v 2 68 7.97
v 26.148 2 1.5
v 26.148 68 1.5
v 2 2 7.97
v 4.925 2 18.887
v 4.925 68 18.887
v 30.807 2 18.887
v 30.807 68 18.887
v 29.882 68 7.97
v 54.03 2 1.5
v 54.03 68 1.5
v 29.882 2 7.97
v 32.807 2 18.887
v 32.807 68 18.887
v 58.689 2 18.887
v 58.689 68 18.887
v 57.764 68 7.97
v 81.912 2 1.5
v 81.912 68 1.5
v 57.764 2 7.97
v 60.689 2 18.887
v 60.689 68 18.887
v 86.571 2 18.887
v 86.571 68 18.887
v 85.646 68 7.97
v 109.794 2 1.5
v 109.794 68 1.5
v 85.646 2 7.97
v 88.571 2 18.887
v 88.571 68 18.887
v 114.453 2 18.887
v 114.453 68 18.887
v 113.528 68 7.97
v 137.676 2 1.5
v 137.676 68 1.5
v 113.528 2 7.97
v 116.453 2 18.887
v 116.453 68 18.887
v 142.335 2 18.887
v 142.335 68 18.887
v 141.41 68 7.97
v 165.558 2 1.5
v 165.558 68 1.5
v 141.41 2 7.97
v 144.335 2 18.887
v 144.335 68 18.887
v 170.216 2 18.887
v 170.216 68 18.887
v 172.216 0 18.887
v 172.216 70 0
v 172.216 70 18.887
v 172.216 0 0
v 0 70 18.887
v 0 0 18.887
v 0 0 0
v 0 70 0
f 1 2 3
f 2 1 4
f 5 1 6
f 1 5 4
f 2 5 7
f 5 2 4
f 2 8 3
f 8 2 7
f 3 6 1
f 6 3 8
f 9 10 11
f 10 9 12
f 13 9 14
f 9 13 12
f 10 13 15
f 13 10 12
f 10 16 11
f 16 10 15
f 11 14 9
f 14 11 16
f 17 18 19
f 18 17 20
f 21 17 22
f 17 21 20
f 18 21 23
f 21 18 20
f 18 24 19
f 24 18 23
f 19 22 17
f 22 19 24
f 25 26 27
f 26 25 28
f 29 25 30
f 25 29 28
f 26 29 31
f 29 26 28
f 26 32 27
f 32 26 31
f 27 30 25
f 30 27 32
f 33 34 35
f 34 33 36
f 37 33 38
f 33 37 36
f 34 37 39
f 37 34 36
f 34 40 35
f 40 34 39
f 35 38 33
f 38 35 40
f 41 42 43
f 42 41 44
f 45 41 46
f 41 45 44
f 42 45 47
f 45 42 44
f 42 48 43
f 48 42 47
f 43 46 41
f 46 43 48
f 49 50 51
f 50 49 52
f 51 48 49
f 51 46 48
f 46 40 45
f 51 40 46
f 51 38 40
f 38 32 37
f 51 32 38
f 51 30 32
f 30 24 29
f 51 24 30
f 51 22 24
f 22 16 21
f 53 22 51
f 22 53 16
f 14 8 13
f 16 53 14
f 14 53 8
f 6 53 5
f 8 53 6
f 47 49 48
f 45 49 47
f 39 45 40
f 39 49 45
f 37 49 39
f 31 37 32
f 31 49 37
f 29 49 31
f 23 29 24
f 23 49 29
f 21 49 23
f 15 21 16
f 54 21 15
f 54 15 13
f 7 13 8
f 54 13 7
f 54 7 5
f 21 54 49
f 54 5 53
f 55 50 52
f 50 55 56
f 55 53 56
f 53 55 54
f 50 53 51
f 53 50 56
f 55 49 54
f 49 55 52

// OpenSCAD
/* [Magstand] */

mags = 6; // [1:100]
magsize_length = 66; // [1:200]
magsize_width = 25; // [1:200]
magsize_height = 18; // [1:200]
mag_gap = 2;

mag_inclination_deg = 15;  // [0:45]
// text_inclination_deg = 11;

holder_base_height = 1.5; // [0.5:10]

// text_side = "none";
// text_offset = 1.5;
// text_size = 10;
// text = "AR-15 5.56";

/* [Hidden] */

// Vars
complete_height = holder_base_height + magsize_height;
hole_maker = 0.01;

// Magazine slots    
maghole_points = [[0,0],[magsize_width,0],[magsize_width,magsize_length],[0,magsize_length]];

// Rotated point
maghole_point = [magsize_width,0];
maghole_point_rotated = rotate_point(maghole_point[0],maghole_point[1], -mag_inclination_deg);

// Normal inclination (-1/incl)
maghole_norm_incl = -1 / ((maghole_point_rotated[1] / maghole_point_rotated[0]));    
maghole_norm_ground_ix = -1 * (maghole_point_rotated[1] / maghole_norm_incl);

// Offset that is needed to satisfy a gap of 0
maghole_offset = maghole_norm_ground_ix + maghole_point_rotated[0];

// The y translation that is needed to satisfy the base height
move_holes_up = -1 * maghole_point_rotated[1] + holder_base_height;

// Calculate hole depth needed to have back edge completely sunken
maghole_point_upper = [magsize_width, magsize_height];
maghole_point_upper_rotated = rotate_point(magsize_width, magsize_height, - mag_inclination_deg);    
holder_height = holder_base_height + ((maghole_point_upper_rotated[0] - maghole_point_rotated[0]) * maghole_norm_incl);

/*
if(text_side == "front") { 
    // Extruded triangle platform for the text    
    translate([0, magsize_length + 4,0])
    rotate([0,-90,90])
    linear_extrude(height = magsize_length + 4, convexity = 10, twist = 0)
    polygon(points=[[0,0],[holder_height,0],[0,holder_height]]);
    
    // Text
    translate([-13, magsize_length + 4 - text_offset, complete_height/2 - text_size / 2.5])
    rotate([45,0,-90])
    linear_extrude(height = 2, convexity = 10, twist = 0)
    text(text, size = text_size);
}
*/

difference() { 
    // Magazine base
    overall_length=((mags - 1) * maghole_offset + mag_gap) + maghole_point_upper_rotated[0] + mag_gap + ((mags-1) * mag_gap);
    overall_width = magsize_length + 2 * mag_gap;
    cube([overall_length, overall_width, holder_height]);

    echo("Overall length = ", overall_length);
    echo("Overall width = ", overall_width);

    for (a =[0:mags-1]) {
        translate([(maghole_offset + mag_gap) * a + mag_gap, mag_gap, move_holes_up]) {     
              rotate([0,mag_inclination_deg,0]) {
                color("violet", 1 ) linear_extrude(height = magsize_height + hole_maker) polygon(maghole_points);
            }
        }
    }
}




function rotate_point(x, y, deg) = [x * cos(deg) - y * sin(deg), 
                               x * sin(deg) + y * cos(deg)];
